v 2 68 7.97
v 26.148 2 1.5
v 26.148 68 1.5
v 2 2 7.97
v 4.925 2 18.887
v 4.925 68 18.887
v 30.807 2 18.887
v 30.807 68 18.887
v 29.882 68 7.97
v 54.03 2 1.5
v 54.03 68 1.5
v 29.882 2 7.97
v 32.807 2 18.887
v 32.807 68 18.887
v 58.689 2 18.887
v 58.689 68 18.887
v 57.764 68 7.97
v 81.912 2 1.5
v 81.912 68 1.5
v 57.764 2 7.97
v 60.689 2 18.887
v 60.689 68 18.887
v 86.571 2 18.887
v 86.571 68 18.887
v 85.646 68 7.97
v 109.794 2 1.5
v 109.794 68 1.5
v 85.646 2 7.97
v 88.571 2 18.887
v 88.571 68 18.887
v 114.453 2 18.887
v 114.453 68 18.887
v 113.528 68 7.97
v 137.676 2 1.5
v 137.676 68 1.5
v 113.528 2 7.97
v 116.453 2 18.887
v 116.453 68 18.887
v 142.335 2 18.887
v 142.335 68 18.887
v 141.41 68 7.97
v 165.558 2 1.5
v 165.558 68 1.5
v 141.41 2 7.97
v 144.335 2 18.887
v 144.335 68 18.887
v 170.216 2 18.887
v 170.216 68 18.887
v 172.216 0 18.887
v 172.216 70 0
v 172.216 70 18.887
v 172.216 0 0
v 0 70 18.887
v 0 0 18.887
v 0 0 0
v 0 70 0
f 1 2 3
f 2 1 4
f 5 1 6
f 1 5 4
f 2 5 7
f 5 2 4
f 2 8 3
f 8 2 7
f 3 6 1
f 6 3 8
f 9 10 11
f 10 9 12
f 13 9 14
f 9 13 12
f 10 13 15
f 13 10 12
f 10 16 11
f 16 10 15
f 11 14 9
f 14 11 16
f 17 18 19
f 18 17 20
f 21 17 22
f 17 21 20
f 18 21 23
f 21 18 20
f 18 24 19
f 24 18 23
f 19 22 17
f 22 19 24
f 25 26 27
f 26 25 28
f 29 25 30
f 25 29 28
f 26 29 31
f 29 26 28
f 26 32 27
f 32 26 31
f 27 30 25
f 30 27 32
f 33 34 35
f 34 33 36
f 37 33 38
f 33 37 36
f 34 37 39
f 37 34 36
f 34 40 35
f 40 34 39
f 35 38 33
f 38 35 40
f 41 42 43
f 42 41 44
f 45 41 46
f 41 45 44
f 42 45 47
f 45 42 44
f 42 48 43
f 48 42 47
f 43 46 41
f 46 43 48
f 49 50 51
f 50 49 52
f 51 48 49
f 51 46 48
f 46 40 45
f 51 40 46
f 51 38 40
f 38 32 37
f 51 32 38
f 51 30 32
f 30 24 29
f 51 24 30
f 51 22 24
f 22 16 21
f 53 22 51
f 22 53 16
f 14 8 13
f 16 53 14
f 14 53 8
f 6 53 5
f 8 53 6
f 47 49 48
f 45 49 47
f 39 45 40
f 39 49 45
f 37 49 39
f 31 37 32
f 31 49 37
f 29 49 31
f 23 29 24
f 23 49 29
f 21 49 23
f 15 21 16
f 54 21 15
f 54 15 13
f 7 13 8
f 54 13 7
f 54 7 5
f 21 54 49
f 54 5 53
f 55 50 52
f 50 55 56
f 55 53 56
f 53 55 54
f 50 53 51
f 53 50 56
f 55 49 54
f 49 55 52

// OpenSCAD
/* [Magstand] */

mags = 6; // [1:100]
magsize_length = 66; // [1:200]
magsize_width = 25; // [1:200]
magsize_height = 18; // [1:200]
mag_gap = 2;

mag_inclination_deg = 15;  // [0:45]
// text_inclination_deg = 11;

holder_base_height = 1.5; // [0.5:10]

// text_side = "none";
// text_offset = 1.5;
// text_size = 10;
// text = "AR-15 5.56";

/* [Hidden] */

// Vars
complete_height = holder_base_height + magsize_height;
hole_maker = 0.01;

// Magazine slots    
maghole_points = [[0,0],[magsize_width,0],[magsize_width,magsize_length],[0,magsize_length]];

// Rotated point
maghole_point = [magsize_width,0];
maghole_point_rotated = rotate_point(maghole_point[0],maghole_point[1], -mag_inclination_deg);

// Normal inclination (-1/incl)
maghole_norm_incl = -1 / ((maghole_point_rotated[1] / maghole_point_rotated[0]));    
maghole_norm_ground_ix = -1 * (maghole_point_rotated[1] / maghole_norm_incl);

// Offset that is needed to satisfy a gap of 0
maghole_offset = maghole_norm_ground_ix + maghole_point_rotated[0];

// The y translation that is needed to satisfy the base height
move_holes_up = -1 * maghole_point_rotated[1] + holder_base_height;

// Calculate hole depth needed to have back edge completely sunken
maghole_point_upper = [magsize_width, magsize_height];
maghole_point_upper_rotated = rotate_point(magsize_width, magsize_height, - mag_inclination_deg);    
holder_height = holder_base_height + ((maghole_point_upper_rotated[0] - maghole_point_rotated[0]) * maghole_norm_incl);

/*
if(text_side == "front") { 
    // Extruded triangle platform for the text    
    translate([0, magsize_length + 4,0])
    rotate([0,-90,90])
    linear_extrude(height = magsize_length + 4, convexity = 10, twist = 0)
    polygon(points=[[0,0],[holder_height,0],[0,holder_height]]);
    
    // Text
    translate([-13, magsize_length + 4 - text_offset, complete_height/2 - text_size / 2.5])
    rotate([45,0,-90])
    linear_extrude(height = 2, convexity = 10, twist = 0)
    text(text, size = text_size);
}
*/

difference() { 
    // Magazine base
    overall_length=((mags - 1) * maghole_offset + mag_gap) + maghole_point_upper_rotated[0] + mag_gap + ((mags-1) * mag_gap);
    overall_width = magsize_length + 2 * mag_gap;
    cube([overall_length, overall_width, holder_height]);

    echo("Overall length = ", overall_length);
    echo("Overall width = ", overall_width);

    for (a =[0:mags-1]) {
        translate([(maghole_offset + mag_gap) * a + mag_gap, mag_gap, move_holes_up]) {     
              rotate([0,mag_inclination_deg,0]) {
                color("violet", 1 ) linear_extrude(height = magsize_height + hole_maker) polygon(maghole_points);
            }
        }
    }
}




function rotate_point(x, y, deg) = [x * cos(deg) - y * sin(deg), 
                               x * sin(deg) + y * cos(deg)];
